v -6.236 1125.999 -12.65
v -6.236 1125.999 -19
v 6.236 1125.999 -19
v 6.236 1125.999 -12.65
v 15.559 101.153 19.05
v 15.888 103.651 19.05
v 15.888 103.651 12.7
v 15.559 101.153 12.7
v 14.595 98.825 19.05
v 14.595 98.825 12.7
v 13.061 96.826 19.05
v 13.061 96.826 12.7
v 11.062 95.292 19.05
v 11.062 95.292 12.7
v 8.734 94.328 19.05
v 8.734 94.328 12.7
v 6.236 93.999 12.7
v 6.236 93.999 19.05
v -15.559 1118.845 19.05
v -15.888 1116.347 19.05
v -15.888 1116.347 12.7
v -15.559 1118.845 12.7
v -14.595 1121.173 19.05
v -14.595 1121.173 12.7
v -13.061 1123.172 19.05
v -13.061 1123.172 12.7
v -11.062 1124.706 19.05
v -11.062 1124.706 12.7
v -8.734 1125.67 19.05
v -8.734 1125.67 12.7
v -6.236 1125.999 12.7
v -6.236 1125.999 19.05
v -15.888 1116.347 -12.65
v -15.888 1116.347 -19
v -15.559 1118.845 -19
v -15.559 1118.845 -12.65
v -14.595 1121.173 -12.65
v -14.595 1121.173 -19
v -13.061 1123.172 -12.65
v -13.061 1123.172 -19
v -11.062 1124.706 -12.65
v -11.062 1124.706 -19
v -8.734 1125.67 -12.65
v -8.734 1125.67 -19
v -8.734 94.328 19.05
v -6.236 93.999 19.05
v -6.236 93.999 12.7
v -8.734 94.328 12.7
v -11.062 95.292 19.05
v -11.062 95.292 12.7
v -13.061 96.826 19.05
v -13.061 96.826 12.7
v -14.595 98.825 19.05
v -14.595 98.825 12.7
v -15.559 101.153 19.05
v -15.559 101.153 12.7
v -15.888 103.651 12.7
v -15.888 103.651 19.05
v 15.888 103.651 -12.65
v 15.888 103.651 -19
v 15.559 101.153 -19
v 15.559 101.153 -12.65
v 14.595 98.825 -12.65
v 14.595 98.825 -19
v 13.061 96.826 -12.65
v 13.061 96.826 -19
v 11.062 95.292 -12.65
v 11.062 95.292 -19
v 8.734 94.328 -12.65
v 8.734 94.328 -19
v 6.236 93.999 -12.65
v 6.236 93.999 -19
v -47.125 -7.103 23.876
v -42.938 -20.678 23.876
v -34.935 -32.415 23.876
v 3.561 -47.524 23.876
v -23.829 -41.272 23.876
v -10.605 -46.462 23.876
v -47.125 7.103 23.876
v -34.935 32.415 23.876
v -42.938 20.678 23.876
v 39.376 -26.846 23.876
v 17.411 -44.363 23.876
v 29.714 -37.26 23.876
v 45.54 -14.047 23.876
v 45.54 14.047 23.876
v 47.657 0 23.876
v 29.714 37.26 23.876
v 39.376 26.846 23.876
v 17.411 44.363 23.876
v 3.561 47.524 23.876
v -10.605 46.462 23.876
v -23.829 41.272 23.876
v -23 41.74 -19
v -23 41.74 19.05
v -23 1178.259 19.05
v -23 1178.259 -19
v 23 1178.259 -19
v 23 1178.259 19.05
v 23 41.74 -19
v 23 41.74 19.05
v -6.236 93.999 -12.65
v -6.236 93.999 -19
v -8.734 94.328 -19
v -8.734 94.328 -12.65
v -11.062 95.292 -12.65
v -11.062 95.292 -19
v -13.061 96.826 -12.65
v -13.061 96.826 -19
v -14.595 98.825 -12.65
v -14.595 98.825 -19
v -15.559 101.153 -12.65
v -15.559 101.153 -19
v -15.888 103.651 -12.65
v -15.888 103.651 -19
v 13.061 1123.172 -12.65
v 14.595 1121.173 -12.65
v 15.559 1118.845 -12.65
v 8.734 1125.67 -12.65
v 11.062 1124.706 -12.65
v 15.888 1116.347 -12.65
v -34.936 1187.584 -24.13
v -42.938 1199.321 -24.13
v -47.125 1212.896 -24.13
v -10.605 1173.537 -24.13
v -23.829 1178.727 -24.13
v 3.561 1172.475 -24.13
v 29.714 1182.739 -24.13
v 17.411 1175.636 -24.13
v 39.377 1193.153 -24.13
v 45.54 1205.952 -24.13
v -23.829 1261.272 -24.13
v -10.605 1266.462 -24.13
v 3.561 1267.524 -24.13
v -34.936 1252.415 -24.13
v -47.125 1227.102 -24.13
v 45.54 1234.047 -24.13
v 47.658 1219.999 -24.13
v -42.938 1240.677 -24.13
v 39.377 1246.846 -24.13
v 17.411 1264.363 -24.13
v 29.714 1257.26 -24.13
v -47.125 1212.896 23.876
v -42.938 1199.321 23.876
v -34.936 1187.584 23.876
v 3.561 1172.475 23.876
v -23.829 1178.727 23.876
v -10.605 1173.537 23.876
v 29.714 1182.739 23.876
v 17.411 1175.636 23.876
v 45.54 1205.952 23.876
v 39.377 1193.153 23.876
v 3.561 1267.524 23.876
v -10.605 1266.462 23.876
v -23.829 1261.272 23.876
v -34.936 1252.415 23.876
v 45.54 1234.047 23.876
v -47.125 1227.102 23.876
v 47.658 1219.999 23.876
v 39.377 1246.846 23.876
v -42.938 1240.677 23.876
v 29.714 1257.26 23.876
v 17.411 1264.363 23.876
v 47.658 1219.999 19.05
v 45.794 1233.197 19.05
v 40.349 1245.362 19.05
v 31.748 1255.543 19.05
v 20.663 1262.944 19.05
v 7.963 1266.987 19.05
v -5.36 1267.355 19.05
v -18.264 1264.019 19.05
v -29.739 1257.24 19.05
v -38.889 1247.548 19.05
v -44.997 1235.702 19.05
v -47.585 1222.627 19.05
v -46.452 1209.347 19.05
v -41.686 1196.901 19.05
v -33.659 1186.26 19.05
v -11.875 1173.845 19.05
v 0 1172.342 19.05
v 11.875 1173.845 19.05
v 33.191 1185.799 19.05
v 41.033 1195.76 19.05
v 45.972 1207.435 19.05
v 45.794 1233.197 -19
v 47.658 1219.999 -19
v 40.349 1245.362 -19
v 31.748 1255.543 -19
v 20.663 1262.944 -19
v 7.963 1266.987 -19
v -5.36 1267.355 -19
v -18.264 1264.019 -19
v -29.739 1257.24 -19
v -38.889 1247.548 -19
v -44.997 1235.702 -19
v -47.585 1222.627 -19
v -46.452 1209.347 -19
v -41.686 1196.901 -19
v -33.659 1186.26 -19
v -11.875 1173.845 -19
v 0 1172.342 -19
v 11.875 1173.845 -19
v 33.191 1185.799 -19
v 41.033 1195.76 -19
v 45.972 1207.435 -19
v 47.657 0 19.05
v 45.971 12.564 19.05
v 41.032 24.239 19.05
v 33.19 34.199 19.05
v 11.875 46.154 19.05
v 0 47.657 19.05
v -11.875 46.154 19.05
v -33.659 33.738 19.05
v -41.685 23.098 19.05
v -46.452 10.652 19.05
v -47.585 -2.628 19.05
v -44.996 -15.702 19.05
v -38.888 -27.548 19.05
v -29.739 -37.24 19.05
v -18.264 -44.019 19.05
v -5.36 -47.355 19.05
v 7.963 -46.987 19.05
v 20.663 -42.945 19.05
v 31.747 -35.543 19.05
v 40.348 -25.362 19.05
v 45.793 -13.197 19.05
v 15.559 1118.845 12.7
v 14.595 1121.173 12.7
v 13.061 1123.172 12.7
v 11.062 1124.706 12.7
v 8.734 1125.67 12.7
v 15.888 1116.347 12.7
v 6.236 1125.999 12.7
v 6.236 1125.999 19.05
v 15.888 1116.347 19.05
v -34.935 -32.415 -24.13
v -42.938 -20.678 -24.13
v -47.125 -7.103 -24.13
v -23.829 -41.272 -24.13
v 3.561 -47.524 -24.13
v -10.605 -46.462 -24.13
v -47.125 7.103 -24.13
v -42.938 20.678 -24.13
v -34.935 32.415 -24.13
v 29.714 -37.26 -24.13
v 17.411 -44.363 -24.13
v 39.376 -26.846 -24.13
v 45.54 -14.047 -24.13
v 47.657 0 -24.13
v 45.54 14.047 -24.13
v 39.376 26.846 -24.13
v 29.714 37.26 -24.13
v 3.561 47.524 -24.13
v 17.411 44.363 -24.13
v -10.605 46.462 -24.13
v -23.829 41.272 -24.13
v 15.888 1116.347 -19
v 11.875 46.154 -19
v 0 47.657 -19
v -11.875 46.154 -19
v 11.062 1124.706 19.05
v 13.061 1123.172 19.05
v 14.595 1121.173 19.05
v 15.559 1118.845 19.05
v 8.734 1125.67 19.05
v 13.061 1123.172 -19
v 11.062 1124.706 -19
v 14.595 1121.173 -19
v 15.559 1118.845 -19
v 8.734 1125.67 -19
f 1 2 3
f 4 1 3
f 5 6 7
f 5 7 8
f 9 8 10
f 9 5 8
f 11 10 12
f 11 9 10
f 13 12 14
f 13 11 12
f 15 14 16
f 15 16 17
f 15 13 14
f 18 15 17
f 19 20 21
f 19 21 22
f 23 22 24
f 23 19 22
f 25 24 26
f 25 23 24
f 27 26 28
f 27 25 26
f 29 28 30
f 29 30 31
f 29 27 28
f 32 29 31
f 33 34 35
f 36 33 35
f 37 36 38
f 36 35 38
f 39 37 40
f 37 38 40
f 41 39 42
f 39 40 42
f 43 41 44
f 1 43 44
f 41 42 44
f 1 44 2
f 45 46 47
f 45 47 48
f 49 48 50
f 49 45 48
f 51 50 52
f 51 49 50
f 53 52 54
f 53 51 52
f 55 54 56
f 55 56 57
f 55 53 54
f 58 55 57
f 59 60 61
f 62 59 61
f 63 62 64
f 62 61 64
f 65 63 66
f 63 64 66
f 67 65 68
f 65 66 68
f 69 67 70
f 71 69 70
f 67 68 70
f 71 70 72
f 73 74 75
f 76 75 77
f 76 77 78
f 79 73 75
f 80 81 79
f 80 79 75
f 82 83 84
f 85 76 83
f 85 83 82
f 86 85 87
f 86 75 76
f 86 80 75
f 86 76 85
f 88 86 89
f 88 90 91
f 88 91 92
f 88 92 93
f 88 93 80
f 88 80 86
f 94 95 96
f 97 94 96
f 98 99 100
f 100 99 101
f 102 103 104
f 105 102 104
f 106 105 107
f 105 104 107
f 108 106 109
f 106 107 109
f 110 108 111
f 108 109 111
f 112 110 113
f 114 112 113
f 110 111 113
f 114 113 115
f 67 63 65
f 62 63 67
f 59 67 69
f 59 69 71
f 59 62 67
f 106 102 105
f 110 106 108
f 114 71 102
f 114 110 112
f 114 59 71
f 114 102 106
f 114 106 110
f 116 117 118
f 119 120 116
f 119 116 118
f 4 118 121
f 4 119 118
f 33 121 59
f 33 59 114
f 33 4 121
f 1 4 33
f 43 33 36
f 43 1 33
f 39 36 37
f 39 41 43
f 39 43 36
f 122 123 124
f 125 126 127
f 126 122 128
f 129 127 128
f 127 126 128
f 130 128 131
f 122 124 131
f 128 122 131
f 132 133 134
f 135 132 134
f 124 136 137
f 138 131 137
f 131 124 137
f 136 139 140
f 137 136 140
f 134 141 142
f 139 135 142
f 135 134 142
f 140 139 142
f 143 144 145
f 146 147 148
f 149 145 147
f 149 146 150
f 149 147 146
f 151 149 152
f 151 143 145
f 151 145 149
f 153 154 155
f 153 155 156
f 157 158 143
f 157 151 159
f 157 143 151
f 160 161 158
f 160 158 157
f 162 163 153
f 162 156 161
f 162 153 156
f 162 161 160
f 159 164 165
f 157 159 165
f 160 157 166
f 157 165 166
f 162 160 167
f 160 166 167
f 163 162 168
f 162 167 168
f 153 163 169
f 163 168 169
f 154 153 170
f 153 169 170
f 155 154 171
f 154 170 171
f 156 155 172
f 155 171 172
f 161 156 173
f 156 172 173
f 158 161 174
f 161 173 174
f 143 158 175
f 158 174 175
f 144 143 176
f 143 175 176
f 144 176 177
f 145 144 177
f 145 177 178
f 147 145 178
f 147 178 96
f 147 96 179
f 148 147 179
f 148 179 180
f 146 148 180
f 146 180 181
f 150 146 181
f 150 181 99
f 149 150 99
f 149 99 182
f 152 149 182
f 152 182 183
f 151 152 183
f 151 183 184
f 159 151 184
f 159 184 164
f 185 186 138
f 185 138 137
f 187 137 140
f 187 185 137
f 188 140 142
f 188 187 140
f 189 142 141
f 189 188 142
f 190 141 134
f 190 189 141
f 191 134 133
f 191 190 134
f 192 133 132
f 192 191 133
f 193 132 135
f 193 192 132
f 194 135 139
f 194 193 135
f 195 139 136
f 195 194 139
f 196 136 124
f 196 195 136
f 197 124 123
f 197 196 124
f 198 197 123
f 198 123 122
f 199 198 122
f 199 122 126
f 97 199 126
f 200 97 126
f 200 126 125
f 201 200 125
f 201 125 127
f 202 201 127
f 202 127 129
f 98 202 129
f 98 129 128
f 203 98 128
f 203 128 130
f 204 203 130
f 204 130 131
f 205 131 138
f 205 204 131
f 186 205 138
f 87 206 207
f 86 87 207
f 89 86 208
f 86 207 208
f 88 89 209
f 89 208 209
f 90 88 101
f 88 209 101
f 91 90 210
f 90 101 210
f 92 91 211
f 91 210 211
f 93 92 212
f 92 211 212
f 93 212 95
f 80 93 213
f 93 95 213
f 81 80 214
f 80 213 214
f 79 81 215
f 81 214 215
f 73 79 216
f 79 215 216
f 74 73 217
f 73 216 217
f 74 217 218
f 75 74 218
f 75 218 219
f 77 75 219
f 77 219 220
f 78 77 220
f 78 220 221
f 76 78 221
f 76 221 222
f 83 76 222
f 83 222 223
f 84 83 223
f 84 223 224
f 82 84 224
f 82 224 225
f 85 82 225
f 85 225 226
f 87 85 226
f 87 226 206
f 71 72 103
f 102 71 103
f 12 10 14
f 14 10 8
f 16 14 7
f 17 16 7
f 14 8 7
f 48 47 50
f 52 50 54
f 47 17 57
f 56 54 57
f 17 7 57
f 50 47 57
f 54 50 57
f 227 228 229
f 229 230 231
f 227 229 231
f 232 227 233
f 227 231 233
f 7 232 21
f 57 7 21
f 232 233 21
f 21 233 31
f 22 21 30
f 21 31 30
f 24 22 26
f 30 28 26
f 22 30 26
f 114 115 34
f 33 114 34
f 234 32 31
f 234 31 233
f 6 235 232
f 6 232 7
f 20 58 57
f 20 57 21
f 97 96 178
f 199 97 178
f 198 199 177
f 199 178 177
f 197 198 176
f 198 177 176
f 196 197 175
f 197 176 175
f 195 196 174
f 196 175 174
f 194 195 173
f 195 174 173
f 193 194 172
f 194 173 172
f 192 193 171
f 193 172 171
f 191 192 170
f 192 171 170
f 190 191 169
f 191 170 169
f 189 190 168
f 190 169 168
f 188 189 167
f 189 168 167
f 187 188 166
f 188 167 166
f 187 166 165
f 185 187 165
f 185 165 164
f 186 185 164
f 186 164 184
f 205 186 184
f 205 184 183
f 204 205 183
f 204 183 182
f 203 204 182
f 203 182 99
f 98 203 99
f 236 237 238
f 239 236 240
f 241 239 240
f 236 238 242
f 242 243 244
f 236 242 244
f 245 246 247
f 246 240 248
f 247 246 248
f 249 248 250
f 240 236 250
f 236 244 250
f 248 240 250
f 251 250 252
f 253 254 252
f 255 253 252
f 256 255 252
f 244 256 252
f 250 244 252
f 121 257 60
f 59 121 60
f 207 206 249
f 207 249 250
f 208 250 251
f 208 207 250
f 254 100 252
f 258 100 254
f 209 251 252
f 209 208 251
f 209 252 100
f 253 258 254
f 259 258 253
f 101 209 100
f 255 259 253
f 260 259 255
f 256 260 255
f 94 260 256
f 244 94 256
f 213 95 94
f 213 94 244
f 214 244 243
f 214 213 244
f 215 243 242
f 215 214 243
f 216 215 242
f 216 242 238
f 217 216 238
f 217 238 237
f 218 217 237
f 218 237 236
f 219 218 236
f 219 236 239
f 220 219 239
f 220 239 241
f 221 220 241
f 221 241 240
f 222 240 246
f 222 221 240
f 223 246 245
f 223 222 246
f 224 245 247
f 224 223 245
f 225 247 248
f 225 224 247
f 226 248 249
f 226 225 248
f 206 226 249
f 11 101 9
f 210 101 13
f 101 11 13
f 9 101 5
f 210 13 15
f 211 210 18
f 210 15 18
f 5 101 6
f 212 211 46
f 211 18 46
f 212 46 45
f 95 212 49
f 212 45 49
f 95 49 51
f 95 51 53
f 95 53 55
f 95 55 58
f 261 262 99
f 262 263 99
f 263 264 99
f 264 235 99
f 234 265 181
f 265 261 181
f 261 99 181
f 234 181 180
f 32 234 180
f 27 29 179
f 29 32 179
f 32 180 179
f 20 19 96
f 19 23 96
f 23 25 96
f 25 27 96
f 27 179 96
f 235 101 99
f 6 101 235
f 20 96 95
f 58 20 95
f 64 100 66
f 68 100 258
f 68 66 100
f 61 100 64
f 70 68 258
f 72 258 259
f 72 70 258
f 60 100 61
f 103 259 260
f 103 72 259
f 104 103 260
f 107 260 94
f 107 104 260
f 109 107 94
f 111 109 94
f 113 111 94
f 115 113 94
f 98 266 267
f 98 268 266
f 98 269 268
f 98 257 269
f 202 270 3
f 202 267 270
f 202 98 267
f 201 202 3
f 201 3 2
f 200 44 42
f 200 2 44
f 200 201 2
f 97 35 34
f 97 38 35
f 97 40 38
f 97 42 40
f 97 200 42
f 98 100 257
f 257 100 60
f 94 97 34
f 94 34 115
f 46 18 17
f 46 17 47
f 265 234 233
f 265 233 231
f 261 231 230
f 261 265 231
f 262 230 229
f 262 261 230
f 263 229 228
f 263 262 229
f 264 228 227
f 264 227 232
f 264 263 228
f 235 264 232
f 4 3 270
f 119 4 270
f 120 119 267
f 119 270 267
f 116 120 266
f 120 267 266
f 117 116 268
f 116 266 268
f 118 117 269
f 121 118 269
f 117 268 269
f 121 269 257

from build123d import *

# Parameters (mm, degrees)
EXTRUDE1_DEPTH      = 19.05
EXTRUDE1_DEPTH_BACK = 19
CUT_EXTRUDE1_DEPTH  = 6.35
CUT_EXTRUDE2_DEPTH  = 6.35
SKETCH6_R           = 47.657715
SKETCH6_R_2         = 47.657166
EXTRUDE2_DEPTH      = 4.826
EXTRUDE2_DEPTH_BACK = 43.18


with BuildPart() as part:
    # Sketch3 → Extrude1 (new body, two sides)
    with BuildSketch(Plane.XY) as extrude1_sk:
        with BuildLine():
            Line((23, 1178.259012), (23, 41.73971))
            ThreePointArc((23, 41.73971), (0, -47.657144), (-23, 41.73971))
            Line((-23, 41.73971), (-23, 1178.259012))
            ThreePointArc((-23, 1178.259012), (0, 1267.657089), (23, 1178.259012))
        make_face()
    extrude(amount=EXTRUDE1_DEPTH)
    extrude(extrude1_sk.sketch, amount=-EXTRUDE1_DEPTH_BACK)

    # Sketch4 → Cut-Extrude1 (cut)
    with BuildSketch(Plane.XY.offset(19.05)):
        with BuildLine():
            Line((15.888, 1116.347374), (15.888, 103.651374))
            ThreePointArc((15.888, 103.651374), (13.060995, 96.826379), (6.236, 93.999374))
            Line((6.236, 93.999374), (-6.236, 93.999374))
            ThreePointArc((-6.236, 93.999374), (-13.060995, 96.826379), (-15.888, 103.651374))
            Line((-15.888, 103.651374), (-15.888, 1116.347374))
            ThreePointArc((-15.888, 1116.347374), (-13.060995, 1123.172368), (-6.236, 1125.999374))
            Line((-6.236, 1125.999374), (6.236, 1125.999374))
            ThreePointArc((6.236, 1125.999374), (13.060995, 1123.172368), (15.888, 1116.347374))
        make_face()
    extrude(amount=-CUT_EXTRUDE1_DEPTH, mode=Mode.SUBTRACT)

    # Sketch5 → Cut-Extrude2 (cut)
    with BuildSketch(Plane(origin=(0, 0, -19), x_dir=(-1, 0, 0), z_dir=(0, 0, -1))):
        with BuildLine():
            Line((-15.888, 1116.347374), (-15.888, 103.651374))
            ThreePointArc((-15.888, 103.651374), (-13.060995, 96.826379), (-6.236, 93.999374))
            Line((-6.236, 93.999374), (6.236, 93.999374))
            ThreePointArc((6.236, 93.999374), (13.060995, 96.826379), (15.888, 103.651374))
            Line((15.888, 103.651374), (15.888, 1116.347374))
            ThreePointArc((15.888, 1116.347374), (13.060995, 1123.172368), (6.236, 1125.999374))
            Line((6.236, 1125.999374), (-6.236, 1125.999374))
            ThreePointArc((-6.236, 1125.999374), (-13.060995, 1123.172368), (-15.888, 1116.347374))
        make_face()
    extrude(amount=-CUT_EXTRUDE2_DEPTH, mode=Mode.SUBTRACT)

    # Sketch6 → Extrude2 (add, two sides)
    with BuildSketch(Plane.XY.offset(19.05)) as extrude2_sk:
        with Locations((0, 1219.999374)):
            Circle(SKETCH6_R)
        Circle(SKETCH6_R_2)
    extrude(amount=EXTRUDE2_DEPTH)
    extrude(extrude2_sk.sketch, amount=-EXTRUDE2_DEPTH_BACK)


solid = part.part
